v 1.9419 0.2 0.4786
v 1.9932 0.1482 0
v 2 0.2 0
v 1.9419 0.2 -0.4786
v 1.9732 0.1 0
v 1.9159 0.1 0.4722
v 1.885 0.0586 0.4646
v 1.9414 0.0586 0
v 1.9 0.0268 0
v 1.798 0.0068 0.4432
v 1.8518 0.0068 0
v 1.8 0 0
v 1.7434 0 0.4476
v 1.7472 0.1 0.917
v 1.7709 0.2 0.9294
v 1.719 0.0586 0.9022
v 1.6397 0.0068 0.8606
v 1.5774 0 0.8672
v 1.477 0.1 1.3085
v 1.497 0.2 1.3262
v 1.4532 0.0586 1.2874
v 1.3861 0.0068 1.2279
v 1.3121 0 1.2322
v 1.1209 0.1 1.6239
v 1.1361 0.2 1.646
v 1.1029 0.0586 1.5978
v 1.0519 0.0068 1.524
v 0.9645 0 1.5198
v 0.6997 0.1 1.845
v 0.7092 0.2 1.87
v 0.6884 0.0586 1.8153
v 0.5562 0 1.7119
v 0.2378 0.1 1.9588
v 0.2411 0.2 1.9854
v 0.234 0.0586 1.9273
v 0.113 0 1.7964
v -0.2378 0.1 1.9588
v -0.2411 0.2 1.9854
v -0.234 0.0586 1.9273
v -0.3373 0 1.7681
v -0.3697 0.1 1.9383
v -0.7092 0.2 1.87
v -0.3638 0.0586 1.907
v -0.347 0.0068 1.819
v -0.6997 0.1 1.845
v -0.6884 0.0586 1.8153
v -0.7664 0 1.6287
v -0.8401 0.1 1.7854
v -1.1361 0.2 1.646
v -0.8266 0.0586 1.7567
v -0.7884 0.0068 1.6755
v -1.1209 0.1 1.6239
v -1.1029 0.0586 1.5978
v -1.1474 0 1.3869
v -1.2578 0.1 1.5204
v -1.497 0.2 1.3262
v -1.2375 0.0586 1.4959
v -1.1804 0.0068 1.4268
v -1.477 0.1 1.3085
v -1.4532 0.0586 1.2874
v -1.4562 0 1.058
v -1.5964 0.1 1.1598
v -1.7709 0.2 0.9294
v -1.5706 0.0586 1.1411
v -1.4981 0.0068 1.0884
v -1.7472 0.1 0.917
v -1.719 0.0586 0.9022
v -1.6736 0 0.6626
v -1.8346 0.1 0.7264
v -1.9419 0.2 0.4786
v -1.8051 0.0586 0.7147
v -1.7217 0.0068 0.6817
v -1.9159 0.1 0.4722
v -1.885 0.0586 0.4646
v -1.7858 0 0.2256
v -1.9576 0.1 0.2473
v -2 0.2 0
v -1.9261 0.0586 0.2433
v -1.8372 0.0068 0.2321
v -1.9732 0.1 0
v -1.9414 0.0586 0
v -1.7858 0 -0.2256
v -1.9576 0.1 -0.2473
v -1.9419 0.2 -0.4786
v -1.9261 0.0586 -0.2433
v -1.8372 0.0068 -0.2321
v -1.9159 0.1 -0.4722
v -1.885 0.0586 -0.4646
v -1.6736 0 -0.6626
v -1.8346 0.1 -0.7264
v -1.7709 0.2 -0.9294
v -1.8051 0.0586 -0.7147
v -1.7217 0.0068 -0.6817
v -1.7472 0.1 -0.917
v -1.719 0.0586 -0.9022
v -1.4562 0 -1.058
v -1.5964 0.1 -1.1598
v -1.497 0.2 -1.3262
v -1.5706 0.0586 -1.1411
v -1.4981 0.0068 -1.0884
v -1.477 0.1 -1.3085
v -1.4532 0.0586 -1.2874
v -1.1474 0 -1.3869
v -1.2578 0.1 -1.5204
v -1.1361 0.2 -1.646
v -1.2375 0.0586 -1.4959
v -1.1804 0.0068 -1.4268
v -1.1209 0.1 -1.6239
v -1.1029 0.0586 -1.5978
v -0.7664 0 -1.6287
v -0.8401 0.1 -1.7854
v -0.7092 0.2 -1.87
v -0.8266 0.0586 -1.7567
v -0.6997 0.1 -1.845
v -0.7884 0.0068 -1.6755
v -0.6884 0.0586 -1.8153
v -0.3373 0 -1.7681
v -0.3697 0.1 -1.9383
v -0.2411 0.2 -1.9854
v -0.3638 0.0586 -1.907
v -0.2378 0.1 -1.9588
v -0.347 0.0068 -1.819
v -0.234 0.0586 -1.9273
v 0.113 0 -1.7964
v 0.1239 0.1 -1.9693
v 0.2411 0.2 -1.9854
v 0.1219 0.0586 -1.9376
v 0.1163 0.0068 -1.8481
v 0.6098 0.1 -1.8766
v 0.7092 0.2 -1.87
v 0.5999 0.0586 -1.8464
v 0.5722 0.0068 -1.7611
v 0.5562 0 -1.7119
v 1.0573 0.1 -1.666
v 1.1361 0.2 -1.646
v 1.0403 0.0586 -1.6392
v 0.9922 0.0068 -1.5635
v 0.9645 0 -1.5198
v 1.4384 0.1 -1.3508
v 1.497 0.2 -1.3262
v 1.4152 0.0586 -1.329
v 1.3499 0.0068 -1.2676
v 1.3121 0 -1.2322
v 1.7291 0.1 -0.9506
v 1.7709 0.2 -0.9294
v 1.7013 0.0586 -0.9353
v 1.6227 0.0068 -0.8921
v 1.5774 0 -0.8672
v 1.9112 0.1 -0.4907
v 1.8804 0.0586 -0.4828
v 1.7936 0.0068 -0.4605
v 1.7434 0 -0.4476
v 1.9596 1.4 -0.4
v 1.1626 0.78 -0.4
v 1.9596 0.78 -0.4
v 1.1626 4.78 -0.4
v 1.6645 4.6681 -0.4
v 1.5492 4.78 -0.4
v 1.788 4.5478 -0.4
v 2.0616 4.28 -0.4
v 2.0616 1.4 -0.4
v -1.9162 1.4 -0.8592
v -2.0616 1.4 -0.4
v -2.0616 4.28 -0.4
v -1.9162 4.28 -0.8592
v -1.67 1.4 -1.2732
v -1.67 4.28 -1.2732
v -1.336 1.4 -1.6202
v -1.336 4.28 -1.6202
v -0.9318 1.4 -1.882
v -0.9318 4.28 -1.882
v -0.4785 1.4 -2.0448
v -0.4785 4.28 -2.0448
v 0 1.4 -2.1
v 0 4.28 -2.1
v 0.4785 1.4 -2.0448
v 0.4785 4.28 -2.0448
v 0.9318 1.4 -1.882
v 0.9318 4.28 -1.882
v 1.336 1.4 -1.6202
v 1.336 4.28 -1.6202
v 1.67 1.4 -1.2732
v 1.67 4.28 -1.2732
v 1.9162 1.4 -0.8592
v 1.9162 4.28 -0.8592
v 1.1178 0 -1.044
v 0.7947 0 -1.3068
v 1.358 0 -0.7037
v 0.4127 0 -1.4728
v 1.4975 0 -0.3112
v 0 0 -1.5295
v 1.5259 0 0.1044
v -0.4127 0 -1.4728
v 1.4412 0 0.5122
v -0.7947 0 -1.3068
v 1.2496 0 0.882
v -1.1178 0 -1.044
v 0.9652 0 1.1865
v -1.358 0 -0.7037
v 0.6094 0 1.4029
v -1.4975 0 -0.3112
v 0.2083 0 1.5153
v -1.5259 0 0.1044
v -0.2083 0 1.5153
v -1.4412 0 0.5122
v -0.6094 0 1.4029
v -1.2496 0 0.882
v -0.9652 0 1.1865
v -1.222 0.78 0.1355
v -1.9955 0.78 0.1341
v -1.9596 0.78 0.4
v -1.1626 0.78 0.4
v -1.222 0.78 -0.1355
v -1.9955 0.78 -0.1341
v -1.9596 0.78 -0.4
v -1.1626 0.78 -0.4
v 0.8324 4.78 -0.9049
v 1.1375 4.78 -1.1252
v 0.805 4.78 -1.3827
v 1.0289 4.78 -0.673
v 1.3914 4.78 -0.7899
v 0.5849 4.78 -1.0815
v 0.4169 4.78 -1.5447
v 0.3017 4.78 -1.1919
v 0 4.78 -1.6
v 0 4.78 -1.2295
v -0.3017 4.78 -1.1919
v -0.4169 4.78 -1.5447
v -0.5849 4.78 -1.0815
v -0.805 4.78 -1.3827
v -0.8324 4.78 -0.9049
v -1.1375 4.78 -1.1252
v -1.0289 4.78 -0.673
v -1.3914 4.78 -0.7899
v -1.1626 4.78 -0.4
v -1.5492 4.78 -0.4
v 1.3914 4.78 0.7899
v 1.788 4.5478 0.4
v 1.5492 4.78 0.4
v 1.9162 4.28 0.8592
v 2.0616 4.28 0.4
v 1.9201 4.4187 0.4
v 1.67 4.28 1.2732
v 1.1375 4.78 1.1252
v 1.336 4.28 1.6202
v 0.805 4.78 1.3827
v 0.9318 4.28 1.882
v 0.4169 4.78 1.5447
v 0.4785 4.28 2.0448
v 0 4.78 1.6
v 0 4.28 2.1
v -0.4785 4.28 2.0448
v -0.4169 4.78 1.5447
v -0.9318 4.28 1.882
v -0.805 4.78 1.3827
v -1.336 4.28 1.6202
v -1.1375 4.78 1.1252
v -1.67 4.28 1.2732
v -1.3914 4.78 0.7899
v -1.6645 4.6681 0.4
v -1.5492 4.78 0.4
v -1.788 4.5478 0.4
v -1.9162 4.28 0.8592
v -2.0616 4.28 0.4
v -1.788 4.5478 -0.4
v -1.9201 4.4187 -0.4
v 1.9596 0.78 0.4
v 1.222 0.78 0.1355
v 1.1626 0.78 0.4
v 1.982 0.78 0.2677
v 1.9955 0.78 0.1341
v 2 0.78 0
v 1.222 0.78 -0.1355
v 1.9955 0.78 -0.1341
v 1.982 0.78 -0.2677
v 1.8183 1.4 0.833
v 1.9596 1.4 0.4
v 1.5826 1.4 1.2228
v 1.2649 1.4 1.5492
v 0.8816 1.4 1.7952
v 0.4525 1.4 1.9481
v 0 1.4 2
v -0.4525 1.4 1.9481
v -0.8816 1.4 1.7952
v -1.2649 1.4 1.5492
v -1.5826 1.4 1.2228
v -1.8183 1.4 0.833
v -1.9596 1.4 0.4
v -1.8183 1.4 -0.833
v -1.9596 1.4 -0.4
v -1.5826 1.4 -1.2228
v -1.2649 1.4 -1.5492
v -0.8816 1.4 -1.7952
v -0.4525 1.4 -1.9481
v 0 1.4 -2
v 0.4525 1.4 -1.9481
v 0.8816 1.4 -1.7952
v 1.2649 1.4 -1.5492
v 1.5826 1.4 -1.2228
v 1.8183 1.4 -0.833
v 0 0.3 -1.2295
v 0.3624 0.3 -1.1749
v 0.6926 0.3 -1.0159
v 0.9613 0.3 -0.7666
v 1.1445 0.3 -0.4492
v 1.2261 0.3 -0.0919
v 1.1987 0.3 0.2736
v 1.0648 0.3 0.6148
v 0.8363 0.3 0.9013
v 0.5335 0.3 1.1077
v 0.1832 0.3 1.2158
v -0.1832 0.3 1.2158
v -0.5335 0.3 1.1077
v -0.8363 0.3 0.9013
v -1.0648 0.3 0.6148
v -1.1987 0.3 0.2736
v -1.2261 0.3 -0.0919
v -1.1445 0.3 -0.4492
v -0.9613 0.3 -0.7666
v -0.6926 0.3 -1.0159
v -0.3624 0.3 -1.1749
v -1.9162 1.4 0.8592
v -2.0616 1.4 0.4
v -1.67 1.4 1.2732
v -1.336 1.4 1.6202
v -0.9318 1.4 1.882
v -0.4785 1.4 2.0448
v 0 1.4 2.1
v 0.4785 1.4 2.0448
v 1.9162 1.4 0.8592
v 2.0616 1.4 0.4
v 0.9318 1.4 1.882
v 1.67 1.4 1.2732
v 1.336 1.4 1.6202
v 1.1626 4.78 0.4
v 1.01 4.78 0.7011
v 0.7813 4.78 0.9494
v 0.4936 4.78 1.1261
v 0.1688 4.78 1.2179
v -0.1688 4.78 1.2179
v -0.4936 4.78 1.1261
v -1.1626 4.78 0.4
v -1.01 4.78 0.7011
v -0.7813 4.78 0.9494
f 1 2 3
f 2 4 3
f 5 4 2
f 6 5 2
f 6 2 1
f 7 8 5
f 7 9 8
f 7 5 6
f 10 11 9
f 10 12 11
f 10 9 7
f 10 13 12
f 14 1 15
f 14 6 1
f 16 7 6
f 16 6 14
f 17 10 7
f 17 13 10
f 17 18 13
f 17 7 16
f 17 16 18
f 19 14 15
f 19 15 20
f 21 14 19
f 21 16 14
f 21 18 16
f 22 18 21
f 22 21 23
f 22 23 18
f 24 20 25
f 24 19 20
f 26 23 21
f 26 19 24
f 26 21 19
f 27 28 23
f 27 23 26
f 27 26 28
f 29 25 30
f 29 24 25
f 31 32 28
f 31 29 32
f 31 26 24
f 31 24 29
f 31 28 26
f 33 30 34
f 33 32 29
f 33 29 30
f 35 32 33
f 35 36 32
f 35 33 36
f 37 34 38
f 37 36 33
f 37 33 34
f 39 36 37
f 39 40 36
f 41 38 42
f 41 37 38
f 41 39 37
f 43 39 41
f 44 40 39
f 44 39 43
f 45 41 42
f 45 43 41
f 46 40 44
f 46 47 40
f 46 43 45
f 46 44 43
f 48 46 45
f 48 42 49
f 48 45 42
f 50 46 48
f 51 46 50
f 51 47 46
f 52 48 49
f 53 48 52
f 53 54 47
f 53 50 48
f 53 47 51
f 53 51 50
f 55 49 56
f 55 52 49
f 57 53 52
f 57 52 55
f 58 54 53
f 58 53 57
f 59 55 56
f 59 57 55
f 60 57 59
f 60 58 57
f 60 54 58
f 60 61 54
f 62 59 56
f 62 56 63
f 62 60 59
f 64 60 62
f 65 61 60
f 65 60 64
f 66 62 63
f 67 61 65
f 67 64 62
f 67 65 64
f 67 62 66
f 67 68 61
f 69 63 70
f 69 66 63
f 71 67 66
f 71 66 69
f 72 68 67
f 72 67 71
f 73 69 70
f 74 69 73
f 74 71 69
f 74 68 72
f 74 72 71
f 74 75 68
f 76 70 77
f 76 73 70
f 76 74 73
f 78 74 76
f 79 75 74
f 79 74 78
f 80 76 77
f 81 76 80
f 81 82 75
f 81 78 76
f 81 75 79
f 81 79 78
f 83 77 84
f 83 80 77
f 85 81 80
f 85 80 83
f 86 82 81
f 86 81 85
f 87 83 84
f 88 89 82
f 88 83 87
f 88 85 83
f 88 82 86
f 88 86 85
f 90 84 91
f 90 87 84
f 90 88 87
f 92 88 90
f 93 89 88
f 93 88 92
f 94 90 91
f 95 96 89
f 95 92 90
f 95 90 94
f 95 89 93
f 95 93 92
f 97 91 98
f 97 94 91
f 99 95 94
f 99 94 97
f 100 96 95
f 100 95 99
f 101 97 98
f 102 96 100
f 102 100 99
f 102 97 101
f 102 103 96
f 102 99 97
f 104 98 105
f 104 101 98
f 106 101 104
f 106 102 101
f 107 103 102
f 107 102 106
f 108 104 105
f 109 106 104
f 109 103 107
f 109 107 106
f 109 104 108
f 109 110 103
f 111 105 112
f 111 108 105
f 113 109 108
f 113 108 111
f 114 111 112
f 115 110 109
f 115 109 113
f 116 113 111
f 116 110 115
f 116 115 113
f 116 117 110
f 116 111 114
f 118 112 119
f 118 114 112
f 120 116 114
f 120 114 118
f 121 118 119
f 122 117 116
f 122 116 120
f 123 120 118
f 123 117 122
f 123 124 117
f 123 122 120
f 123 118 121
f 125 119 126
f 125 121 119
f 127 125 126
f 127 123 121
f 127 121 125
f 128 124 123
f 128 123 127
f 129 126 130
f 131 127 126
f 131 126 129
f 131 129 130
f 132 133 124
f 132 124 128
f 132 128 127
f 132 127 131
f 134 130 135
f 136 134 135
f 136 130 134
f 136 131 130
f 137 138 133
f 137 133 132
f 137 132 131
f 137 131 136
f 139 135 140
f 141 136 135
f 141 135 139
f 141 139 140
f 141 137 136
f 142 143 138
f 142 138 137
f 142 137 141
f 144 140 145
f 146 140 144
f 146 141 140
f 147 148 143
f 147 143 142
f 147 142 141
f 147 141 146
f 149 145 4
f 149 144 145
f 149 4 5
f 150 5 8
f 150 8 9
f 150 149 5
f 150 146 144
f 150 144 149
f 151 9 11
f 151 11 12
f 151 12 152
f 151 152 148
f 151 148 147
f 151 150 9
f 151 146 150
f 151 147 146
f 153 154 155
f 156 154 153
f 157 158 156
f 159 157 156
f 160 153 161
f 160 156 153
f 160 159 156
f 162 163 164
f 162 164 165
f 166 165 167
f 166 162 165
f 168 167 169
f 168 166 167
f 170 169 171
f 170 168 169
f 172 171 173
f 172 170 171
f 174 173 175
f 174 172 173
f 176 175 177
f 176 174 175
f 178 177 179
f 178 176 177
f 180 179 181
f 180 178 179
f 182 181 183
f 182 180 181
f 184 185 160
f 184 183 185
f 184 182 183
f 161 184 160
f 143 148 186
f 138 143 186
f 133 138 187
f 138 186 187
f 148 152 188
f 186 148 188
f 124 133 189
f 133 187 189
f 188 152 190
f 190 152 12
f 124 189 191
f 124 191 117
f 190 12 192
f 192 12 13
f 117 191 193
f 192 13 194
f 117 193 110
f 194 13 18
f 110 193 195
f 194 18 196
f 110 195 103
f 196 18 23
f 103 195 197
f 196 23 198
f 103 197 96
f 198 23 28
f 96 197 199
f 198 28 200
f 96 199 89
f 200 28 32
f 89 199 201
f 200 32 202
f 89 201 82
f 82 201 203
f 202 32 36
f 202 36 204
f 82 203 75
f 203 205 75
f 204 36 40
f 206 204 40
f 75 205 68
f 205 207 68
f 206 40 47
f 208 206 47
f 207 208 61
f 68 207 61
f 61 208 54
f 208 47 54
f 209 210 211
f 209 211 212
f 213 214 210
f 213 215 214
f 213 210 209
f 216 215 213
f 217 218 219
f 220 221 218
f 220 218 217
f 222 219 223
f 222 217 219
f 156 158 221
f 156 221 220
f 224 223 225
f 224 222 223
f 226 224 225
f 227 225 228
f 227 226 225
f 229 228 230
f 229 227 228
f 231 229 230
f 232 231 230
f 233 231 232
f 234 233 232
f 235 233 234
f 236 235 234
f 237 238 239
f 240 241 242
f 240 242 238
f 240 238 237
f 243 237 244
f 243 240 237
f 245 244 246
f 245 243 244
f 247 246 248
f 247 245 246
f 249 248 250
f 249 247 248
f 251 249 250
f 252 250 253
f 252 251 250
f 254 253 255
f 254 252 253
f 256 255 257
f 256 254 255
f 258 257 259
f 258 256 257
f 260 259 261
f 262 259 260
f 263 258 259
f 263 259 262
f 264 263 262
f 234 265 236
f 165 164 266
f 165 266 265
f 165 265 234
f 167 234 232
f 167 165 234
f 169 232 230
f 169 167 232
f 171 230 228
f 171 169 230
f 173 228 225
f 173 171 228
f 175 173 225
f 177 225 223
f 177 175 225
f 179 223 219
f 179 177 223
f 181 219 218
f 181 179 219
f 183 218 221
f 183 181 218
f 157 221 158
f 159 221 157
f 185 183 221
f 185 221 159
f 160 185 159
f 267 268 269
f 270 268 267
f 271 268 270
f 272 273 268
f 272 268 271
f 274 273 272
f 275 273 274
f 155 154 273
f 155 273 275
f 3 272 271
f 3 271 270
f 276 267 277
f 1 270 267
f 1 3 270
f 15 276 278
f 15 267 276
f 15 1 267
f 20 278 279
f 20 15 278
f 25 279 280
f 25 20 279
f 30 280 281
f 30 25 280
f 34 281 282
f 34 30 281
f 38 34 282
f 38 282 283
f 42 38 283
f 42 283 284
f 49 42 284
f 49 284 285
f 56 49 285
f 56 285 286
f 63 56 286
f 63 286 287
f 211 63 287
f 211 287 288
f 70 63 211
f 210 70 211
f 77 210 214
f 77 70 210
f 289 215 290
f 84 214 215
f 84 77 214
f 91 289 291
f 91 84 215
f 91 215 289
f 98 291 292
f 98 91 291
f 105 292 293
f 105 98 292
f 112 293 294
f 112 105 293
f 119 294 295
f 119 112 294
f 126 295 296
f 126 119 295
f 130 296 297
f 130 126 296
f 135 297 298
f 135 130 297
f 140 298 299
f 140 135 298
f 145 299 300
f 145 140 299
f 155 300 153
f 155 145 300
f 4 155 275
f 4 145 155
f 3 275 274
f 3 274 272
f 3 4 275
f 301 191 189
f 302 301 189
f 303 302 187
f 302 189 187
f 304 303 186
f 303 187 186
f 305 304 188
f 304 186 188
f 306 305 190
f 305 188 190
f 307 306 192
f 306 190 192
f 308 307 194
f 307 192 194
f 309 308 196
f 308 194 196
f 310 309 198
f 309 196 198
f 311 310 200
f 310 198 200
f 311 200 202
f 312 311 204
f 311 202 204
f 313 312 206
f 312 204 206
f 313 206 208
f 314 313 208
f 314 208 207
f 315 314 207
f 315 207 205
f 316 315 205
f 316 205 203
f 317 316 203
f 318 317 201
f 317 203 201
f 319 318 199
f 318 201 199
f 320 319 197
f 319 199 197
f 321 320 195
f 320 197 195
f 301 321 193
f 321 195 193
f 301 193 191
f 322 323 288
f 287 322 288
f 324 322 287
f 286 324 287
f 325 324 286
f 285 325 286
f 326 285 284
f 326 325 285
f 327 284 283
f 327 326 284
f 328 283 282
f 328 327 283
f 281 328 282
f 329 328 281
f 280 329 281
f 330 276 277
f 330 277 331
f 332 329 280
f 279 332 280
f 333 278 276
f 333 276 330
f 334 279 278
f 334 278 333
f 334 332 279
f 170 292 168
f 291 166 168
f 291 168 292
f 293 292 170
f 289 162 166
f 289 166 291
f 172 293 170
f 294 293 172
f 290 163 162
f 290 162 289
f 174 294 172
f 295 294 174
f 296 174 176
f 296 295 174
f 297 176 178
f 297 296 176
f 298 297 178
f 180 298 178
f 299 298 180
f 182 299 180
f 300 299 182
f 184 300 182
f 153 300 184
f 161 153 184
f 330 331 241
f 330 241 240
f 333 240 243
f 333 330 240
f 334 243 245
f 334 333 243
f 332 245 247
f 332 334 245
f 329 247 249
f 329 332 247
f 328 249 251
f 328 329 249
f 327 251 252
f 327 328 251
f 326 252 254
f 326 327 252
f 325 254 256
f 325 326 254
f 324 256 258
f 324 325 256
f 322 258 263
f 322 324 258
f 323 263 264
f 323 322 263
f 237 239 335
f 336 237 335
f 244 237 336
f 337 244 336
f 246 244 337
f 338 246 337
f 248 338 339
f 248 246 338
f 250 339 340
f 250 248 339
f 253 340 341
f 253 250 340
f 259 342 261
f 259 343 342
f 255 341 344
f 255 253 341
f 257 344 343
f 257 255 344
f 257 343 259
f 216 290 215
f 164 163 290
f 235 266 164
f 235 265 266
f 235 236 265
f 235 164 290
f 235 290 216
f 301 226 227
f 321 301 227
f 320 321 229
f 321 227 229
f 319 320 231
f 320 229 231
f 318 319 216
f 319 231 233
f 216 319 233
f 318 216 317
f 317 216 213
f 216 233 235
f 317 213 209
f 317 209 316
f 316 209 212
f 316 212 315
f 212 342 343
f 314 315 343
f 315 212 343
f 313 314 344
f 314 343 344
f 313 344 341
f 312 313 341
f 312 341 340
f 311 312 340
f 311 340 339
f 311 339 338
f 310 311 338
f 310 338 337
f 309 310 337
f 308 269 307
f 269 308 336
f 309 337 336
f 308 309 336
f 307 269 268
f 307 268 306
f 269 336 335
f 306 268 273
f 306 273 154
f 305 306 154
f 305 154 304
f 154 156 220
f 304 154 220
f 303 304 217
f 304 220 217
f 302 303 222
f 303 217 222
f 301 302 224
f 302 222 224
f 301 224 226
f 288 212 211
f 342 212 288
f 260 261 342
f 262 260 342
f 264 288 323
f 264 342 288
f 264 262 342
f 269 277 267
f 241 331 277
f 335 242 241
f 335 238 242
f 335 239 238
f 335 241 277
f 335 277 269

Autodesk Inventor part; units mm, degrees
ref_plane "YZ Plane" through (0, 0, 0) normal (1, 0, 0) x (0, 1, 0)
ref_plane "XZ Plane" through (0, 0, 0) normal (0, 1, 0) x (-1, 0, 0)
ref_plane "XY Plane" through (0, 0, 0) normal (0, 0, 1) x (1, 0, 0)
sketch "Sketch1" plane through (0, 0, 0) normal (0, 1, 0) x (-1, 0, 0)
  circle A0 centre (0, 0) radius 2.1
  dimension "d0" = 4.2
extrude "Extrusion1" add sketch "Sketch1" along normal blind 4.78
hole "Hole1" at (0, 0, 0) direction (0, 1, 0) diameter 2.459 end through all thread size "M3x0.5" class "6H" standard "ISO Metric profile"
chamfer "Chamfer1" distance 0.5 angle 45 1 edges at (2.1, 4.78, 0)
sketch "Sketch2" plane through (0, 4.78, 0) normal (0, 1, 0) x (1, 0, 0)
  line L0 (2.1, -0.4) -> (-2.1, -0.4)
  line L1 (-2.1, -0.4) -> (-2.1, 0.4)
  line L2 (-2.1, 0.4) -> (2.1, 0.4)
  line L3 (2.1, 0.4) -> (2.1, -0.4)
  circle A0 centre (0, 0) radius 1.2295 projected
  line L4 (2.1, -0.4) -> (-2.1, 0.4) construction
  line L5 (-2.1, -0.4) -> (2.1, 0.4) construction
  circle A1 centre (0, 0) radius 2.1 projected
  point P0 (-2.1, 0)
  dimension "d13" = 0.8
extrude "Extrusion2" cut sketch "Sketch2" against normal blind 4 contours L0 A1 L3 | L0 A0 L2 A1 | A1 L2 L3 | L0 A0 L2 | A1 L2 A0 L0 | L0 L1 A1 | L1 L2 A1
sketch "Sketch3" plane through (0, 0, 0) normal (0, -1, 0) x (1, 0, 0)
  circle A0 centre (0, 0) radius 1.2295 projected
  line L0 (2.0616, 0.4) -> (1.1626, 0.4) projected
  circle A1 centre (0, 0) radius 2.1
  circle A2 centre (0, 0) radius 2
  dimension "d16" = 4
extrude "Extrusion3" cut sketch "Sketch3" against normal blind 1.4
fillet "Fillet1" radius 0.2 1 edges at (-2, 0, 0)
chamfer "Chamfer2" distance 0.3 angle 45 1 edges at (0, 0, 1.2295)
properties part number "RS 278-534 M3 fixing Dia4FixHole" material "Brass, Soft Yellow"
